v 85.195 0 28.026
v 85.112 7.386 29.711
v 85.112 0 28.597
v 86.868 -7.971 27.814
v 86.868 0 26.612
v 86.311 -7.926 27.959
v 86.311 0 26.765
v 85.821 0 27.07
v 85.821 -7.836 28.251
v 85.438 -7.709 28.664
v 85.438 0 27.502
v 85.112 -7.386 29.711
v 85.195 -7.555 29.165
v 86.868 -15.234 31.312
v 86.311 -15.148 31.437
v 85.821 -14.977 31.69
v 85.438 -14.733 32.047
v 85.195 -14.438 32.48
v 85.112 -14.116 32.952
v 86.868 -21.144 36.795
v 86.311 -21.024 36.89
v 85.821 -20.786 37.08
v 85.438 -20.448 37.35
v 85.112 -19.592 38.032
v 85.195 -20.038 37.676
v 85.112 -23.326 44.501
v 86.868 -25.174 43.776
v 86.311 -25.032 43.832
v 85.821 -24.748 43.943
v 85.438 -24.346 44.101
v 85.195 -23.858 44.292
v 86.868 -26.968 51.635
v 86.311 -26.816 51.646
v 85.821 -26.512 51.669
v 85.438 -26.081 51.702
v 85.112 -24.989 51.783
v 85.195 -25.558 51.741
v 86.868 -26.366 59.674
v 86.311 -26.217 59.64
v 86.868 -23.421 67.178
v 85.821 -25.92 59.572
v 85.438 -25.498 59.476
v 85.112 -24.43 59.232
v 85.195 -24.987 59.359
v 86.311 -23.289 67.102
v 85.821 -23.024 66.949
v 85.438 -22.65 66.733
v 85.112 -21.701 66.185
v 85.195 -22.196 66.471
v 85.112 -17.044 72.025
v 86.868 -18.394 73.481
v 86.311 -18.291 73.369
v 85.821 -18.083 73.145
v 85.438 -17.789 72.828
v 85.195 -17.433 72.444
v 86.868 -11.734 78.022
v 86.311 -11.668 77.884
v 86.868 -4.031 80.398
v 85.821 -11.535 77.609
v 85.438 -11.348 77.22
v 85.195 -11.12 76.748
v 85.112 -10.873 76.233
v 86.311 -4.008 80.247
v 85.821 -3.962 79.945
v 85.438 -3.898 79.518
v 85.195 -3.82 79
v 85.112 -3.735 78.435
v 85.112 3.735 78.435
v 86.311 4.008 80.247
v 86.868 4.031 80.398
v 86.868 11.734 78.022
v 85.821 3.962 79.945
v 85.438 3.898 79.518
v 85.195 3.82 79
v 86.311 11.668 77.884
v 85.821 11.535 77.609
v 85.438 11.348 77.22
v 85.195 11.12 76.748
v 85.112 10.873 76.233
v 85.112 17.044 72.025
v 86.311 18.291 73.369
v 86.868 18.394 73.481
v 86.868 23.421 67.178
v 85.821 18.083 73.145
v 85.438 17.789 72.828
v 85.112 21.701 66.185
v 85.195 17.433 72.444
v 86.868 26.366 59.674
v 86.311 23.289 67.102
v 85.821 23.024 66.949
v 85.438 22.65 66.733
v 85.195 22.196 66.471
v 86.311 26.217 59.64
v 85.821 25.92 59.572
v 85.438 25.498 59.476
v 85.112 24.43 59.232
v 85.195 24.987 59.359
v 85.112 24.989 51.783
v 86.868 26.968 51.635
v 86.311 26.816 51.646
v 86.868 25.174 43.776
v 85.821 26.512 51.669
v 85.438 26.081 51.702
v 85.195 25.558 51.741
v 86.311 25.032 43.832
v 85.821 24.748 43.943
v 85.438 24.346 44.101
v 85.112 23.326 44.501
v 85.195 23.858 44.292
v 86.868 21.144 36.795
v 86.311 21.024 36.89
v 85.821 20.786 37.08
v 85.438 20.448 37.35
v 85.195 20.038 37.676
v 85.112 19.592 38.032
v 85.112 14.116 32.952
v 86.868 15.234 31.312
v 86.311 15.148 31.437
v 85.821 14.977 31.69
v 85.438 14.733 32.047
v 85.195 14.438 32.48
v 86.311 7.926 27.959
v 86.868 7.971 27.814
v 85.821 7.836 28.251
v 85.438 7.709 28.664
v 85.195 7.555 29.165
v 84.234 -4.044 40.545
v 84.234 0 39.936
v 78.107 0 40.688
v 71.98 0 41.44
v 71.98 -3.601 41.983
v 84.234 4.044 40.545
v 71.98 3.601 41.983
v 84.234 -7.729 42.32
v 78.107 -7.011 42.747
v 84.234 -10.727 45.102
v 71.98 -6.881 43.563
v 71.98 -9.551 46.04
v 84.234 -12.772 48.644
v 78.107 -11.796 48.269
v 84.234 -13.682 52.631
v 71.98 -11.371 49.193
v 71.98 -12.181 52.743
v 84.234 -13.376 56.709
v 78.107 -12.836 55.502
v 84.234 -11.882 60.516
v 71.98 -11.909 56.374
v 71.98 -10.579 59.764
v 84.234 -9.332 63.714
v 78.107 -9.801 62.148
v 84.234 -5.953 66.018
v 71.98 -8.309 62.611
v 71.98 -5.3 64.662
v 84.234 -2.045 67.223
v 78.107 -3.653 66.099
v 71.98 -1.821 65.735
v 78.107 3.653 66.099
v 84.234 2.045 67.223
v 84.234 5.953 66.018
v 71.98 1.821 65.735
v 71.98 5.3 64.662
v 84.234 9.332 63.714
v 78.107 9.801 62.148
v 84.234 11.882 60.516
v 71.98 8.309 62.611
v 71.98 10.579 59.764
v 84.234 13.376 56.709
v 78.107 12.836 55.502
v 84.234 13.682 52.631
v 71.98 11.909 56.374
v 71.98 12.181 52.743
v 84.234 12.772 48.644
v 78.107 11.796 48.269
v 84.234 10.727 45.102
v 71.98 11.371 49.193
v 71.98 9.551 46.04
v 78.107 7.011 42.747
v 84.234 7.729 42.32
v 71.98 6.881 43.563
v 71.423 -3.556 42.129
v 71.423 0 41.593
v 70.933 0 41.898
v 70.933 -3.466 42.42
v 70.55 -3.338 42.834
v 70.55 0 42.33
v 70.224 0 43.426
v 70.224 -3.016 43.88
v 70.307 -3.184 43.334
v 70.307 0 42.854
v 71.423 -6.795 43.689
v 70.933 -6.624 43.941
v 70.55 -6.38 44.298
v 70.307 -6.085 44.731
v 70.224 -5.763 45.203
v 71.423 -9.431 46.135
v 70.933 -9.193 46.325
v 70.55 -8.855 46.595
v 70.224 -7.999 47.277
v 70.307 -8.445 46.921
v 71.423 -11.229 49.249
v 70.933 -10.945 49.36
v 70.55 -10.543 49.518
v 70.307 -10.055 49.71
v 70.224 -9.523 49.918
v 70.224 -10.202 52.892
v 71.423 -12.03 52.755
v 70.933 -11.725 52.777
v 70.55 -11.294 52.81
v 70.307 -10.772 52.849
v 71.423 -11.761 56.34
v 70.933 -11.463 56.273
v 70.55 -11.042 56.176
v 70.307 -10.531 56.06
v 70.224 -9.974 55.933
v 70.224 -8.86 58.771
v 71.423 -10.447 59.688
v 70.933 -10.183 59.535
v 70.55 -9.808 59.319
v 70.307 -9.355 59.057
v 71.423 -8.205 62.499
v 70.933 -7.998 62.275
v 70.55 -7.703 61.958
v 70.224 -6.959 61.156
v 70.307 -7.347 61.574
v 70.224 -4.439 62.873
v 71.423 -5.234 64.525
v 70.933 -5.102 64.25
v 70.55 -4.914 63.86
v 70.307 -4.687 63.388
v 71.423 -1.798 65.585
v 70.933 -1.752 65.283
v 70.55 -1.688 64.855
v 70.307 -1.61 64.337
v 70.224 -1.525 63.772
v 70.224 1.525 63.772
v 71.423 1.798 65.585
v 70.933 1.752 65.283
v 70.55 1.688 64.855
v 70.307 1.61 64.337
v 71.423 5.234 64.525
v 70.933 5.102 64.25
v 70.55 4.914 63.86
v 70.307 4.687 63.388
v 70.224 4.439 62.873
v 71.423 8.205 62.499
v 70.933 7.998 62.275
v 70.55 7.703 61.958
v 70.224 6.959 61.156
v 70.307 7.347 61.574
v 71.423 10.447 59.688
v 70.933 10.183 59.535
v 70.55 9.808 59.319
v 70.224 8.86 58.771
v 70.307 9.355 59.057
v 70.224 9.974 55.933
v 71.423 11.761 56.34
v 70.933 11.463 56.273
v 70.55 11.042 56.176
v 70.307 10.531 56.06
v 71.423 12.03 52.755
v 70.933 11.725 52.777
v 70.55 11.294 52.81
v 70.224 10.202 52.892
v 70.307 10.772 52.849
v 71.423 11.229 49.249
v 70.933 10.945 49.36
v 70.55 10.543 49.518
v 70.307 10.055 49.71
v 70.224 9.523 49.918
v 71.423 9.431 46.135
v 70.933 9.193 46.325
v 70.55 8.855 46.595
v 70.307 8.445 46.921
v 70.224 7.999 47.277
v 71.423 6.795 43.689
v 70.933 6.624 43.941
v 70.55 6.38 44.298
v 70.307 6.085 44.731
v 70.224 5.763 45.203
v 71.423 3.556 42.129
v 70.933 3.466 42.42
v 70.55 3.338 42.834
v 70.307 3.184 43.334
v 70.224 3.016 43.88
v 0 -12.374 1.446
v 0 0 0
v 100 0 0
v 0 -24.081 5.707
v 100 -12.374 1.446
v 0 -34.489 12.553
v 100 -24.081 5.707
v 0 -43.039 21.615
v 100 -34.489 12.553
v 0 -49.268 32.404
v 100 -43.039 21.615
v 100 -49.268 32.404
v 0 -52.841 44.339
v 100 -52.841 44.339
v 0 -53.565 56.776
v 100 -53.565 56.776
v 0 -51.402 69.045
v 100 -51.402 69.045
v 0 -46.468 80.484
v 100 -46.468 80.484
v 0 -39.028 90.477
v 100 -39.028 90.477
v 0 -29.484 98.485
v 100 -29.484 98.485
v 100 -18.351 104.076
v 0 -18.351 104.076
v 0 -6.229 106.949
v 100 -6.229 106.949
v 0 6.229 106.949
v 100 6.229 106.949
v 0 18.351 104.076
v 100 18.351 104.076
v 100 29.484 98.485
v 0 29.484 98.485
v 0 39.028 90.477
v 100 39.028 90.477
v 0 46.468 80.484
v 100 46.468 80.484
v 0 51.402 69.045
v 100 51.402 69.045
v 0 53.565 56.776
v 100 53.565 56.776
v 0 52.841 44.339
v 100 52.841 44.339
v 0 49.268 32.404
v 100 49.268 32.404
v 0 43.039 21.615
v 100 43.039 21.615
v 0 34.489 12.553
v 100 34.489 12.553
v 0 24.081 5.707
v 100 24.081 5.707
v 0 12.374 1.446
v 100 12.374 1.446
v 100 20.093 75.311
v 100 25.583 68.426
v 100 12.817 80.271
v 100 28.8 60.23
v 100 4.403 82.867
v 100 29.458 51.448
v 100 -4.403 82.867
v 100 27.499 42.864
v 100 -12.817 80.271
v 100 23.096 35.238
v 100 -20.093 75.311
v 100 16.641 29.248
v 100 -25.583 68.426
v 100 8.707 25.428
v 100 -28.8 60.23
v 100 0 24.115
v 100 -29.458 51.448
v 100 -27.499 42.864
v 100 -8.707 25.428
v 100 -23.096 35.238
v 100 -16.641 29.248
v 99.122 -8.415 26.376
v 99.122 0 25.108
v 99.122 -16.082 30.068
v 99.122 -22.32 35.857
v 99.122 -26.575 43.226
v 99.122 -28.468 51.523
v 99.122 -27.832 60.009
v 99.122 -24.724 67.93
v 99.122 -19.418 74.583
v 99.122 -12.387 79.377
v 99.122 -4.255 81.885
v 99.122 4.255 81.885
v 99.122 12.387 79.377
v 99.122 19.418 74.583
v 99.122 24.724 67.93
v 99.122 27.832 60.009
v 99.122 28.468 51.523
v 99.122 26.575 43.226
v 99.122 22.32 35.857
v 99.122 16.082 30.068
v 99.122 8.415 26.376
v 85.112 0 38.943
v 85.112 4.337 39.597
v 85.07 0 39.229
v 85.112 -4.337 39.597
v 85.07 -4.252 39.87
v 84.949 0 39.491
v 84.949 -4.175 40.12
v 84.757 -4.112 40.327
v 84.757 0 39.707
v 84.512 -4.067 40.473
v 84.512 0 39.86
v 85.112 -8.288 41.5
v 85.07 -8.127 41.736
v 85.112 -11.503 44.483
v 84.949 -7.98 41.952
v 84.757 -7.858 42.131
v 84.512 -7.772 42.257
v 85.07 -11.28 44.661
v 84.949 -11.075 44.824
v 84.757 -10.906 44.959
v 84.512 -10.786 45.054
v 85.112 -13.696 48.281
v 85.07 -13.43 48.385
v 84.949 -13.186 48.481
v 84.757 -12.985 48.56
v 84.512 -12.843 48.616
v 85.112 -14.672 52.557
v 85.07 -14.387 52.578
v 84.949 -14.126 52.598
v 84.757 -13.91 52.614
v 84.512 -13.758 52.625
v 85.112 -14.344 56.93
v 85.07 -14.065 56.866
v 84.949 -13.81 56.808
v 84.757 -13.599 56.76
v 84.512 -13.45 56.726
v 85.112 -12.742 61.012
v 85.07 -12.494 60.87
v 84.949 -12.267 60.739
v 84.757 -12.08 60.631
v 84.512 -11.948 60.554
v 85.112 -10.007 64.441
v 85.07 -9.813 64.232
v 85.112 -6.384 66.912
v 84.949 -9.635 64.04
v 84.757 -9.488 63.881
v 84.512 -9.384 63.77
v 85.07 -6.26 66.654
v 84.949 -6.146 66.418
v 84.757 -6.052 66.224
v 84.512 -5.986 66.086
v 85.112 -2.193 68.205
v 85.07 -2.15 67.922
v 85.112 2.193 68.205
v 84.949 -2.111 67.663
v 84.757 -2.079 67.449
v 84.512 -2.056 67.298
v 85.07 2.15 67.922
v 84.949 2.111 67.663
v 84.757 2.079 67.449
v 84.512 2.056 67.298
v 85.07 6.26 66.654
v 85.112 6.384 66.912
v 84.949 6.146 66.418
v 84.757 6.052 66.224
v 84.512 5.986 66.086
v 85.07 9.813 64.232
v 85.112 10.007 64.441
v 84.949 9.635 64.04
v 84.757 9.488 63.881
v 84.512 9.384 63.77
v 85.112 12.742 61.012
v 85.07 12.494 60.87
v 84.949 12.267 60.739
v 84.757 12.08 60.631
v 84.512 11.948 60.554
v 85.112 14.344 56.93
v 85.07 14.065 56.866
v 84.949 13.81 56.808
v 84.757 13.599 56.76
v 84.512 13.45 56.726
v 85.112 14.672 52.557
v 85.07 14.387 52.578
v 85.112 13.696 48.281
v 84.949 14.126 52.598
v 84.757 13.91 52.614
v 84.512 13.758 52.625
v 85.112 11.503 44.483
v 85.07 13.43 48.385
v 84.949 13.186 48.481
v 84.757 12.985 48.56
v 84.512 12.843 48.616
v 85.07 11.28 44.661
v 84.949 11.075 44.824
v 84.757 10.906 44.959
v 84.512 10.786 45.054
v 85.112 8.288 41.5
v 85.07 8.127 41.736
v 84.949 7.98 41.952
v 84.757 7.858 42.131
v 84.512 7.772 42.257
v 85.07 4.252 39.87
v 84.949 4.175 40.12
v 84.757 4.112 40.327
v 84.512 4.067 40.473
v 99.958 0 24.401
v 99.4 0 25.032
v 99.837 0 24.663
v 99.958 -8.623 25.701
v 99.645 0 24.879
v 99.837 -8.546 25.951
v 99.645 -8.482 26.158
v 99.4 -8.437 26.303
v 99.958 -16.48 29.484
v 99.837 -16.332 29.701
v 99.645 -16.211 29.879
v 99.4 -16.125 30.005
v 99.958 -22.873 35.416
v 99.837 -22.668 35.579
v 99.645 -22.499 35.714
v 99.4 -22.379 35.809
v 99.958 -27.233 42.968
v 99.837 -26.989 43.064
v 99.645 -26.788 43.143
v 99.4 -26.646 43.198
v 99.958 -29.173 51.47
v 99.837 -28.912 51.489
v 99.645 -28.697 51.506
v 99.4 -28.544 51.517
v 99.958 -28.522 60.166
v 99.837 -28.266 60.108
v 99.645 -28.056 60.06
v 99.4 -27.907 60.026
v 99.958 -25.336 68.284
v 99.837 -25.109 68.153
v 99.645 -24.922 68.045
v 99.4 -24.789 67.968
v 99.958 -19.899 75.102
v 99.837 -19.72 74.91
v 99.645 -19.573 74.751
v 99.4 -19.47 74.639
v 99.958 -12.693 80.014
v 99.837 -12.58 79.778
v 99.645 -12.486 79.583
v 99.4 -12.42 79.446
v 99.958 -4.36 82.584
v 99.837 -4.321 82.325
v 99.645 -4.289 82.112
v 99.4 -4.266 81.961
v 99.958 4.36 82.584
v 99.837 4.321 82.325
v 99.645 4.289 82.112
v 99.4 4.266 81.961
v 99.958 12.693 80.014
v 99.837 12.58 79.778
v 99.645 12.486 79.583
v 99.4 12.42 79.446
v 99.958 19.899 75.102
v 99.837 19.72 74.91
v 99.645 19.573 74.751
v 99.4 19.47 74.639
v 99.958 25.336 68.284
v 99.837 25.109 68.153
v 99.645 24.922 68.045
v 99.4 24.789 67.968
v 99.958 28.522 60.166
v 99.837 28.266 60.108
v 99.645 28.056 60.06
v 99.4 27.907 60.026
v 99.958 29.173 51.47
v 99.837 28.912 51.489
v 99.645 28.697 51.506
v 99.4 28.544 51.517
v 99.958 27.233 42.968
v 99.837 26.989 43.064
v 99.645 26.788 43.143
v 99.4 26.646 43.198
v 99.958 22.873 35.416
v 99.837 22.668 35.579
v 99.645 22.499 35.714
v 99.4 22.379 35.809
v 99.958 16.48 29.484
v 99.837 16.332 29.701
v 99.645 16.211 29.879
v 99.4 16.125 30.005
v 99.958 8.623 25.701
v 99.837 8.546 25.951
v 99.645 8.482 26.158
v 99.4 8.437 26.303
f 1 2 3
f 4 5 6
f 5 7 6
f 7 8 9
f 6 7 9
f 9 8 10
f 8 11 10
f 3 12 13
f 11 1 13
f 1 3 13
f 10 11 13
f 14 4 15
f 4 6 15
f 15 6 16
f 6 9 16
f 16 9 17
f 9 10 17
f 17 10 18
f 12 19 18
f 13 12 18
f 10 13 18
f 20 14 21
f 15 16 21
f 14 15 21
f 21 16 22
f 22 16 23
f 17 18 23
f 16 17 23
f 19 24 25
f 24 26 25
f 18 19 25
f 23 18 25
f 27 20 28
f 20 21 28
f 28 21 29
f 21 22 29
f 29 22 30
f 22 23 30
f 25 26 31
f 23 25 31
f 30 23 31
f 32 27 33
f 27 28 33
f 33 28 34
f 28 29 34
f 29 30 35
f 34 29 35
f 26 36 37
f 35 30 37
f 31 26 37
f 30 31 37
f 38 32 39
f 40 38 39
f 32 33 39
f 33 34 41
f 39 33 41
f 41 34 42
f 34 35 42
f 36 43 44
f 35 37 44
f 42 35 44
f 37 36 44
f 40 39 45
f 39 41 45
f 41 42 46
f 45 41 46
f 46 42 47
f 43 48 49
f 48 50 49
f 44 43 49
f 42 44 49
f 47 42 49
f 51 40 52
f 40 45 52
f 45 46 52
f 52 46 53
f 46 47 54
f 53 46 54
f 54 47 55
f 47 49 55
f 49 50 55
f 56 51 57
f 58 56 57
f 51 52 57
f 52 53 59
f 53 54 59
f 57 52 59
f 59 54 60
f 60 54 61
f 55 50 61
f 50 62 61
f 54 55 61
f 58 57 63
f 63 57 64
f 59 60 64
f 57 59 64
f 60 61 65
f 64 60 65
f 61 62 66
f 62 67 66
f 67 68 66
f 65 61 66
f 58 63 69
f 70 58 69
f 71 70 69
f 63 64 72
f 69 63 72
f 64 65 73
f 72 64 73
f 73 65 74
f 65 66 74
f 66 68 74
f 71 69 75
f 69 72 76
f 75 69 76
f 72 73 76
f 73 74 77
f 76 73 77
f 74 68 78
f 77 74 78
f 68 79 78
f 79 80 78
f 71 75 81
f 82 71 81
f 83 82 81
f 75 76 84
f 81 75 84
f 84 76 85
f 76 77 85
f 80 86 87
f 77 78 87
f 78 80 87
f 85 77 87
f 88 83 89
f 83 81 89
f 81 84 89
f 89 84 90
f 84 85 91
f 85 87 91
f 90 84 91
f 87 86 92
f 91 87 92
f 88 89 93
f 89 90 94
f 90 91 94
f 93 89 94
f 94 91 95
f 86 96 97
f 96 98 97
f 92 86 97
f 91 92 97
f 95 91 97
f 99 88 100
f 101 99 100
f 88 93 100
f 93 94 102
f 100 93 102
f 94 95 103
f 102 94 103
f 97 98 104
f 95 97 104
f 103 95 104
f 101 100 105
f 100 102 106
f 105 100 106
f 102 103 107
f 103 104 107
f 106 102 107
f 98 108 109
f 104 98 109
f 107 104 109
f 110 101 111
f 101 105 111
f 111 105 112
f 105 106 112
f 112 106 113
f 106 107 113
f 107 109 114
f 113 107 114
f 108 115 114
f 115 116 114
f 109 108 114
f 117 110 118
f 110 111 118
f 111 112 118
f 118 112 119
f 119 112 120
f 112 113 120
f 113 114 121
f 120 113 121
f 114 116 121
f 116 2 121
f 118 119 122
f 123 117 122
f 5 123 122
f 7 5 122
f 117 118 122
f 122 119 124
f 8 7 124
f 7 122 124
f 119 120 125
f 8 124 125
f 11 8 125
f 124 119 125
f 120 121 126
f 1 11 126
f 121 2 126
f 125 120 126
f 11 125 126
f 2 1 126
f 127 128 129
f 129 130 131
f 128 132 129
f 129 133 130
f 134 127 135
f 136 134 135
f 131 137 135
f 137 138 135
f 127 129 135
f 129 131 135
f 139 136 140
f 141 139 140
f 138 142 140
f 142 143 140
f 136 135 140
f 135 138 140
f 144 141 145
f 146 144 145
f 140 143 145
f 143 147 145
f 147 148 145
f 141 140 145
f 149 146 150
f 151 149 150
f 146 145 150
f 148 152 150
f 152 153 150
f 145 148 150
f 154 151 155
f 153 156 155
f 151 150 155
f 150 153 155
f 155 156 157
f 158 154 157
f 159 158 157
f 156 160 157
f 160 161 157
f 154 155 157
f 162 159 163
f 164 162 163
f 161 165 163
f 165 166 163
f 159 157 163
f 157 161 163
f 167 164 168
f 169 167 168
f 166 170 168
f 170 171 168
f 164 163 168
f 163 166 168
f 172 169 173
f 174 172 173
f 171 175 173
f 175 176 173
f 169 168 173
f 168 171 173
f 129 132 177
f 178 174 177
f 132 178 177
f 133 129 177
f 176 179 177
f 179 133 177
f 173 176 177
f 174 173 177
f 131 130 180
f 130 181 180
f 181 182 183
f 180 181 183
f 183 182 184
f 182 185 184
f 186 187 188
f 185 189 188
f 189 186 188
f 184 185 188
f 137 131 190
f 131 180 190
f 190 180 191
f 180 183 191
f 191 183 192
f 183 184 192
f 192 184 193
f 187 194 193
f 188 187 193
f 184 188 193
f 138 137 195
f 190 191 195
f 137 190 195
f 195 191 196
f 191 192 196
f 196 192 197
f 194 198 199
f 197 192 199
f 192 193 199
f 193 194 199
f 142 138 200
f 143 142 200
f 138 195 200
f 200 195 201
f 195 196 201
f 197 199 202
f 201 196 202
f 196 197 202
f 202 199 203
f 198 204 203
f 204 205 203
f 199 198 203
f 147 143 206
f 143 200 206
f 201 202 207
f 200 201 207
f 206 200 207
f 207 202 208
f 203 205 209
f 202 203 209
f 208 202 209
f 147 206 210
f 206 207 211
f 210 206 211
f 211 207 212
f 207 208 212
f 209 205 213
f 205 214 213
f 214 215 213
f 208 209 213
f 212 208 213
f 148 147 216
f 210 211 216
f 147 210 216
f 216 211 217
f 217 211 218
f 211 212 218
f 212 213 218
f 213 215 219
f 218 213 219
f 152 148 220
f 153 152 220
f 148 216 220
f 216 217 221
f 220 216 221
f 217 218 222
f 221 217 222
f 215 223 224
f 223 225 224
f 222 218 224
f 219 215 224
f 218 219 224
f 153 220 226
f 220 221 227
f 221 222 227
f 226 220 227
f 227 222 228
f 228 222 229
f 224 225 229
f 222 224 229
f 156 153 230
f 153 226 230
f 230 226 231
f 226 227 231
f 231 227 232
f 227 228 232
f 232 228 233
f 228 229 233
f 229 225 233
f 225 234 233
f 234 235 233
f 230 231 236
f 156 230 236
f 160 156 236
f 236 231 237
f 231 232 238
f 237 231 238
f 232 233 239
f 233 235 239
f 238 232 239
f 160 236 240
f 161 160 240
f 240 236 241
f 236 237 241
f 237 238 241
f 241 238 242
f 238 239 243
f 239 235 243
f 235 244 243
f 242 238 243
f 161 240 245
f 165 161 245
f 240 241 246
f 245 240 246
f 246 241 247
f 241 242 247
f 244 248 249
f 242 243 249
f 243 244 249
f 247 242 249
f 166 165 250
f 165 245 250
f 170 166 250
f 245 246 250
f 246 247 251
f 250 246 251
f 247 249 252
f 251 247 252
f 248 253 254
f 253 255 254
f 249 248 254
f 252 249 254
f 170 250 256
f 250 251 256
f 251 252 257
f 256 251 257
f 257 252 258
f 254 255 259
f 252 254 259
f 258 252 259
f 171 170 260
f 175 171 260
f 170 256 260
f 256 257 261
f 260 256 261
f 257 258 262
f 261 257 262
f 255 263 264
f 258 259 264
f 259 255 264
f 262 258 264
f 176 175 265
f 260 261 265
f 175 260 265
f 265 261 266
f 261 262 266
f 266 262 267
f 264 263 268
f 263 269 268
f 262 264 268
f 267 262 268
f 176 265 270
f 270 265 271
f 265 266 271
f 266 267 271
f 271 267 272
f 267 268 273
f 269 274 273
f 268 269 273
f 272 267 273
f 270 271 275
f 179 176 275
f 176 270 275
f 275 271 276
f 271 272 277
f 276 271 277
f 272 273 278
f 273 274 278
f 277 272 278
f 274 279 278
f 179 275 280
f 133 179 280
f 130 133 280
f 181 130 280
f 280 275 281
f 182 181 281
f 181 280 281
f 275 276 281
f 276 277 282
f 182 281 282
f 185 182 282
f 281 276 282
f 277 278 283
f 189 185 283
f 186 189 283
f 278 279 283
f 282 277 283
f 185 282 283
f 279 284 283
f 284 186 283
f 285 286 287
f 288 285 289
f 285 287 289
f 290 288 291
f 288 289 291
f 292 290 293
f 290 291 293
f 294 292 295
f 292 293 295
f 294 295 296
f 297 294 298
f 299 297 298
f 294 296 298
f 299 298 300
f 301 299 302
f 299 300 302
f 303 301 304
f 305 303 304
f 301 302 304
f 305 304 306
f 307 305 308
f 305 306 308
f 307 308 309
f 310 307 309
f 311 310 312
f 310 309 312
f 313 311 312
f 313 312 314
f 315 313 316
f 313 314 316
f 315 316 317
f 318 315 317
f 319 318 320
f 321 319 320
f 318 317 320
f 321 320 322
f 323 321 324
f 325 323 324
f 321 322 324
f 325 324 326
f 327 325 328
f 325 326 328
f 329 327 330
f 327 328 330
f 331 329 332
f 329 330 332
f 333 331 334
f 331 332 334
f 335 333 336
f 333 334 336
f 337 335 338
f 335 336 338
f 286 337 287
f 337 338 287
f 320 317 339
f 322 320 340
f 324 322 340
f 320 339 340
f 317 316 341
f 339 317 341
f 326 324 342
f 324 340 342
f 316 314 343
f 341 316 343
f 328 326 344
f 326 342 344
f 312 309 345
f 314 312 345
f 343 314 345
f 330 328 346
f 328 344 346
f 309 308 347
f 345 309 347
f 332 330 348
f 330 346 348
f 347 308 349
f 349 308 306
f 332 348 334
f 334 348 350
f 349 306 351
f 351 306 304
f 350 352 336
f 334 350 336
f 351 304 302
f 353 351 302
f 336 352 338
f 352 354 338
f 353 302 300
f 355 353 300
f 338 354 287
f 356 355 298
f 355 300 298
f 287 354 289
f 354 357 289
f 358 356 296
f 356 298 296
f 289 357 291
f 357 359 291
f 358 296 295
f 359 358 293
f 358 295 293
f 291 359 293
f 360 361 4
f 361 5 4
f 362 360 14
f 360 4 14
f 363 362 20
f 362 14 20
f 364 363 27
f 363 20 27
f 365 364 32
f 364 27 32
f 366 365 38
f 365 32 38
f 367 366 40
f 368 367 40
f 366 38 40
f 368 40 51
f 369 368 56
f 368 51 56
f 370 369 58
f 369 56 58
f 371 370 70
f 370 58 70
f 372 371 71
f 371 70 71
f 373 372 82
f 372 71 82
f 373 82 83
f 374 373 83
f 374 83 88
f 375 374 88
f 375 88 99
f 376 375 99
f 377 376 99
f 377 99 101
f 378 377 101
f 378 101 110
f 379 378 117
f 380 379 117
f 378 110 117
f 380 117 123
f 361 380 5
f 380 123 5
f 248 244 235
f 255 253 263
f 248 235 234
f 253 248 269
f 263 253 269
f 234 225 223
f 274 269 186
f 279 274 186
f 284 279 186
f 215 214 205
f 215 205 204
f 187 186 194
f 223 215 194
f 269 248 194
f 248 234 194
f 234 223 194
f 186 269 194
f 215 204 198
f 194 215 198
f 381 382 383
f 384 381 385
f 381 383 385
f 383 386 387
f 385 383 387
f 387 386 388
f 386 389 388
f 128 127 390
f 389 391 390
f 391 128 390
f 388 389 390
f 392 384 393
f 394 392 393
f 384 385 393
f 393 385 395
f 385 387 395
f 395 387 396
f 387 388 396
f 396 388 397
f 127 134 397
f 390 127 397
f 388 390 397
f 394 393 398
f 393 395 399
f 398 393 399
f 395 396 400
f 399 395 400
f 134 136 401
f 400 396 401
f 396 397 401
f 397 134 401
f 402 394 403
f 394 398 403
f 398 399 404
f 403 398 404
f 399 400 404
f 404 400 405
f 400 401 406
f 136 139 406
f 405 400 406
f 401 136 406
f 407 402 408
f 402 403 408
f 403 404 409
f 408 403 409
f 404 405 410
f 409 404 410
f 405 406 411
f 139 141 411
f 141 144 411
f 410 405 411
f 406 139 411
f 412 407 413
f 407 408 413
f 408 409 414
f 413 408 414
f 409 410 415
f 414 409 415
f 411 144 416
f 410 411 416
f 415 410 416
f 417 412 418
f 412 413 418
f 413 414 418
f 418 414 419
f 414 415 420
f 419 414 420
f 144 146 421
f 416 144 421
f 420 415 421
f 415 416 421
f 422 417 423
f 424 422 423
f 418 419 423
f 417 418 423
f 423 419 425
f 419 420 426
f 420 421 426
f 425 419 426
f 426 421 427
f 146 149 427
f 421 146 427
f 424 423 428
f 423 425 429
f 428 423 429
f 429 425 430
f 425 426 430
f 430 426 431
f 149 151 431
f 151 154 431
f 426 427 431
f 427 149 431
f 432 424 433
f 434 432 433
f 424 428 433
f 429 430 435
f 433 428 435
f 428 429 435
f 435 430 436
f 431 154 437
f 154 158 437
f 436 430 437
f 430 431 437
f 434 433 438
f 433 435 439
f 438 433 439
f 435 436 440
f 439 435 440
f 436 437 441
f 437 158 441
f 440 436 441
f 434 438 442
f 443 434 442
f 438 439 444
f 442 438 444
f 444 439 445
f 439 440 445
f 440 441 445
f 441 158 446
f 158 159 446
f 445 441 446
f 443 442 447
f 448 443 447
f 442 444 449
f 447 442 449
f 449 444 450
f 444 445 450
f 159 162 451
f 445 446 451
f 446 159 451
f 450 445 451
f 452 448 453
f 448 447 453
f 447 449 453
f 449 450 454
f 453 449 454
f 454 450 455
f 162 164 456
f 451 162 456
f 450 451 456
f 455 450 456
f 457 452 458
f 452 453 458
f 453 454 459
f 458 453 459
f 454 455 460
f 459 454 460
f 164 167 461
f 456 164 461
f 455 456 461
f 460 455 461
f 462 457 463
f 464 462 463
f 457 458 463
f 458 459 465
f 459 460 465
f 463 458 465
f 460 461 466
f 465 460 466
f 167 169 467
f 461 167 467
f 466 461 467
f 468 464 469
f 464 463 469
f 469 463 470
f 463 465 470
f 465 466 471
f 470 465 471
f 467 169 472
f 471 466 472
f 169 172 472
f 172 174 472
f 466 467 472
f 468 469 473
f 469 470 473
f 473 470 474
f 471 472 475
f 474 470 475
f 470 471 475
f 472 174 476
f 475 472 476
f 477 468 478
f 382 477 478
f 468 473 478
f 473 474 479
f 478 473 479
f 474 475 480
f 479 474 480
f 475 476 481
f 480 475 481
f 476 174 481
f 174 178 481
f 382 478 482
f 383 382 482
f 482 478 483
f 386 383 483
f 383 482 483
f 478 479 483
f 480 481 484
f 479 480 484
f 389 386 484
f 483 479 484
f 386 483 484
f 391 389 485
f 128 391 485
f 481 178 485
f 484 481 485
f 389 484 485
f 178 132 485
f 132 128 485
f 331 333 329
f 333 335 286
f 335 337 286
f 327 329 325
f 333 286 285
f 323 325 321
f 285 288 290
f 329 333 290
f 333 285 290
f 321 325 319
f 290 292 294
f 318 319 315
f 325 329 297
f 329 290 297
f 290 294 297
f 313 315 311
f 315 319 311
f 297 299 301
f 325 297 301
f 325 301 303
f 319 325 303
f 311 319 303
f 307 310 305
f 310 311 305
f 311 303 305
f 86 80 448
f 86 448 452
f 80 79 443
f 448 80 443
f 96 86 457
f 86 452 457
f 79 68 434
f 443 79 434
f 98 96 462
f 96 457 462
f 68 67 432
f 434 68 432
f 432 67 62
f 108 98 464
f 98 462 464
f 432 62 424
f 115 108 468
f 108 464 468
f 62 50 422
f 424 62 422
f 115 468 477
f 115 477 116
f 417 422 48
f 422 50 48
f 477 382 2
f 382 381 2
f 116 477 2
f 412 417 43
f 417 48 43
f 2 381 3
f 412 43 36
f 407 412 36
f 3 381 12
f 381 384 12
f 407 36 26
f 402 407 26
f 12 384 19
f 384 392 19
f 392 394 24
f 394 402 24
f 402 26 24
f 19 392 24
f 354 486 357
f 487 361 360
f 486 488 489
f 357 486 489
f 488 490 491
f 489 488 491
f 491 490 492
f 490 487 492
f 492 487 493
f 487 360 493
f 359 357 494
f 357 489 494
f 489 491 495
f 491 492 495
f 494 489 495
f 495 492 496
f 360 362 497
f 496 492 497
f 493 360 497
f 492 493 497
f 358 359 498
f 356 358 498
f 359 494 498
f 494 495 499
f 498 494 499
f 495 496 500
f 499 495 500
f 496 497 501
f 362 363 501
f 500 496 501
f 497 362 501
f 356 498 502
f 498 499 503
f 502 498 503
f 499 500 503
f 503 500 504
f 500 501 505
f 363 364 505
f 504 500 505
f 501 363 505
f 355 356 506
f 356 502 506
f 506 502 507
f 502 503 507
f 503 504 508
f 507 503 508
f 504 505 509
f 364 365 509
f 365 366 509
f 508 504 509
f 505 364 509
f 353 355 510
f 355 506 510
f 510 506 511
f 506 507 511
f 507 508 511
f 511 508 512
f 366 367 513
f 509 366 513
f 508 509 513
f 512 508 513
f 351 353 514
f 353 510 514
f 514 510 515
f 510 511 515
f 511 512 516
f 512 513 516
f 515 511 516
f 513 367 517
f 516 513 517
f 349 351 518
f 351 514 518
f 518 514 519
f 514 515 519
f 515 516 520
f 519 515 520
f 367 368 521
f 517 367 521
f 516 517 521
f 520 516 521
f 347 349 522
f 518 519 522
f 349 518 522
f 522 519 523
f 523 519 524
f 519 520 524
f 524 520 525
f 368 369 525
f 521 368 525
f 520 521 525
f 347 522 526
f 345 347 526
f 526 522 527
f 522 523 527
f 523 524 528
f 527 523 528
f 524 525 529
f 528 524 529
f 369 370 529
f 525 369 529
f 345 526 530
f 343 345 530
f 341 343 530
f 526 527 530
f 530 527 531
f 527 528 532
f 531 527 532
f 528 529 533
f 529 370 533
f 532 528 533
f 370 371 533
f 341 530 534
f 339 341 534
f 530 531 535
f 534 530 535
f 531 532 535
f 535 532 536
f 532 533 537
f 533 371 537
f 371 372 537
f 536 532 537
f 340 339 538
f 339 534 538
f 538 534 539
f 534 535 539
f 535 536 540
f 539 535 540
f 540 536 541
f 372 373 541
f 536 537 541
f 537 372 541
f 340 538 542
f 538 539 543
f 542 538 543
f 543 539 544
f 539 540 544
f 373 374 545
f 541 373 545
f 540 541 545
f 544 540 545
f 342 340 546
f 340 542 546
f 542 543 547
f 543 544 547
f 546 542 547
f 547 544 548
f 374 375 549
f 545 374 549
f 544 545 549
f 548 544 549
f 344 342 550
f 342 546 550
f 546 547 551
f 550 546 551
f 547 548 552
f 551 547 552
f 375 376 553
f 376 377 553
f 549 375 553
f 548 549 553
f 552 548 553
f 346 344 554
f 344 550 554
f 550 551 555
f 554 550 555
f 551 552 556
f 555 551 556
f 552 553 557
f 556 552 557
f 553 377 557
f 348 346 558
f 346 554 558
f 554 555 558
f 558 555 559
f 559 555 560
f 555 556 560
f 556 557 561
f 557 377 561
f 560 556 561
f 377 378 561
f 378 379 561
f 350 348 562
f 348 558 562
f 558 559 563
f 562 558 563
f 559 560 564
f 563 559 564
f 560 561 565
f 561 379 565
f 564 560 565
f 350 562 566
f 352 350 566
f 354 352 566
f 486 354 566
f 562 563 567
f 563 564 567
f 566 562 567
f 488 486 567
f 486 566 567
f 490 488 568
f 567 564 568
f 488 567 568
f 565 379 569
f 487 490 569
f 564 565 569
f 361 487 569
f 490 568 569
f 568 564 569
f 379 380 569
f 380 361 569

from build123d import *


with BuildPart() as f1:
    # F0 (on Front) → F1 (revolve)
    with BuildSketch(Plane.XZ):
        with BuildLine():
            Line((0, 53.65608), (0, 0))
            Line((0, 0), (100, 0))
            Line((100, 0), (100, 24.115275))
            ThreePointArc((100, 24.115275), (99.748956, 24.777895), (99.121869, 25.107821))
            Line((99.121869, 25.107821), (86.868069, 26.612398))
            ThreePointArc((86.868069, 26.612398), (85.613896, 27.272251), (85.111808, 28.597491))
            Line((85.111808, 28.597491), (85.111808, 38.943315))
            ThreePointArc((85.111808, 38.943315), (84.860763, 39.605935), (84.233677, 39.935861))
            Line((84.233677, 39.935861), (71.979877, 41.440439))
            ThreePointArc((71.979877, 41.440439), (70.725704, 42.100291), (70.223615, 43.425531))
            Line((70.223615, 43.425531), (70.223615, 53.65608))
            Line((70.223615, 53.65608), (0, 53.65608))
        make_face()
    revolve(axis=Axis((35.111808, 0, 53.65608), (-1, 0, 0)))


solid = f1.part
